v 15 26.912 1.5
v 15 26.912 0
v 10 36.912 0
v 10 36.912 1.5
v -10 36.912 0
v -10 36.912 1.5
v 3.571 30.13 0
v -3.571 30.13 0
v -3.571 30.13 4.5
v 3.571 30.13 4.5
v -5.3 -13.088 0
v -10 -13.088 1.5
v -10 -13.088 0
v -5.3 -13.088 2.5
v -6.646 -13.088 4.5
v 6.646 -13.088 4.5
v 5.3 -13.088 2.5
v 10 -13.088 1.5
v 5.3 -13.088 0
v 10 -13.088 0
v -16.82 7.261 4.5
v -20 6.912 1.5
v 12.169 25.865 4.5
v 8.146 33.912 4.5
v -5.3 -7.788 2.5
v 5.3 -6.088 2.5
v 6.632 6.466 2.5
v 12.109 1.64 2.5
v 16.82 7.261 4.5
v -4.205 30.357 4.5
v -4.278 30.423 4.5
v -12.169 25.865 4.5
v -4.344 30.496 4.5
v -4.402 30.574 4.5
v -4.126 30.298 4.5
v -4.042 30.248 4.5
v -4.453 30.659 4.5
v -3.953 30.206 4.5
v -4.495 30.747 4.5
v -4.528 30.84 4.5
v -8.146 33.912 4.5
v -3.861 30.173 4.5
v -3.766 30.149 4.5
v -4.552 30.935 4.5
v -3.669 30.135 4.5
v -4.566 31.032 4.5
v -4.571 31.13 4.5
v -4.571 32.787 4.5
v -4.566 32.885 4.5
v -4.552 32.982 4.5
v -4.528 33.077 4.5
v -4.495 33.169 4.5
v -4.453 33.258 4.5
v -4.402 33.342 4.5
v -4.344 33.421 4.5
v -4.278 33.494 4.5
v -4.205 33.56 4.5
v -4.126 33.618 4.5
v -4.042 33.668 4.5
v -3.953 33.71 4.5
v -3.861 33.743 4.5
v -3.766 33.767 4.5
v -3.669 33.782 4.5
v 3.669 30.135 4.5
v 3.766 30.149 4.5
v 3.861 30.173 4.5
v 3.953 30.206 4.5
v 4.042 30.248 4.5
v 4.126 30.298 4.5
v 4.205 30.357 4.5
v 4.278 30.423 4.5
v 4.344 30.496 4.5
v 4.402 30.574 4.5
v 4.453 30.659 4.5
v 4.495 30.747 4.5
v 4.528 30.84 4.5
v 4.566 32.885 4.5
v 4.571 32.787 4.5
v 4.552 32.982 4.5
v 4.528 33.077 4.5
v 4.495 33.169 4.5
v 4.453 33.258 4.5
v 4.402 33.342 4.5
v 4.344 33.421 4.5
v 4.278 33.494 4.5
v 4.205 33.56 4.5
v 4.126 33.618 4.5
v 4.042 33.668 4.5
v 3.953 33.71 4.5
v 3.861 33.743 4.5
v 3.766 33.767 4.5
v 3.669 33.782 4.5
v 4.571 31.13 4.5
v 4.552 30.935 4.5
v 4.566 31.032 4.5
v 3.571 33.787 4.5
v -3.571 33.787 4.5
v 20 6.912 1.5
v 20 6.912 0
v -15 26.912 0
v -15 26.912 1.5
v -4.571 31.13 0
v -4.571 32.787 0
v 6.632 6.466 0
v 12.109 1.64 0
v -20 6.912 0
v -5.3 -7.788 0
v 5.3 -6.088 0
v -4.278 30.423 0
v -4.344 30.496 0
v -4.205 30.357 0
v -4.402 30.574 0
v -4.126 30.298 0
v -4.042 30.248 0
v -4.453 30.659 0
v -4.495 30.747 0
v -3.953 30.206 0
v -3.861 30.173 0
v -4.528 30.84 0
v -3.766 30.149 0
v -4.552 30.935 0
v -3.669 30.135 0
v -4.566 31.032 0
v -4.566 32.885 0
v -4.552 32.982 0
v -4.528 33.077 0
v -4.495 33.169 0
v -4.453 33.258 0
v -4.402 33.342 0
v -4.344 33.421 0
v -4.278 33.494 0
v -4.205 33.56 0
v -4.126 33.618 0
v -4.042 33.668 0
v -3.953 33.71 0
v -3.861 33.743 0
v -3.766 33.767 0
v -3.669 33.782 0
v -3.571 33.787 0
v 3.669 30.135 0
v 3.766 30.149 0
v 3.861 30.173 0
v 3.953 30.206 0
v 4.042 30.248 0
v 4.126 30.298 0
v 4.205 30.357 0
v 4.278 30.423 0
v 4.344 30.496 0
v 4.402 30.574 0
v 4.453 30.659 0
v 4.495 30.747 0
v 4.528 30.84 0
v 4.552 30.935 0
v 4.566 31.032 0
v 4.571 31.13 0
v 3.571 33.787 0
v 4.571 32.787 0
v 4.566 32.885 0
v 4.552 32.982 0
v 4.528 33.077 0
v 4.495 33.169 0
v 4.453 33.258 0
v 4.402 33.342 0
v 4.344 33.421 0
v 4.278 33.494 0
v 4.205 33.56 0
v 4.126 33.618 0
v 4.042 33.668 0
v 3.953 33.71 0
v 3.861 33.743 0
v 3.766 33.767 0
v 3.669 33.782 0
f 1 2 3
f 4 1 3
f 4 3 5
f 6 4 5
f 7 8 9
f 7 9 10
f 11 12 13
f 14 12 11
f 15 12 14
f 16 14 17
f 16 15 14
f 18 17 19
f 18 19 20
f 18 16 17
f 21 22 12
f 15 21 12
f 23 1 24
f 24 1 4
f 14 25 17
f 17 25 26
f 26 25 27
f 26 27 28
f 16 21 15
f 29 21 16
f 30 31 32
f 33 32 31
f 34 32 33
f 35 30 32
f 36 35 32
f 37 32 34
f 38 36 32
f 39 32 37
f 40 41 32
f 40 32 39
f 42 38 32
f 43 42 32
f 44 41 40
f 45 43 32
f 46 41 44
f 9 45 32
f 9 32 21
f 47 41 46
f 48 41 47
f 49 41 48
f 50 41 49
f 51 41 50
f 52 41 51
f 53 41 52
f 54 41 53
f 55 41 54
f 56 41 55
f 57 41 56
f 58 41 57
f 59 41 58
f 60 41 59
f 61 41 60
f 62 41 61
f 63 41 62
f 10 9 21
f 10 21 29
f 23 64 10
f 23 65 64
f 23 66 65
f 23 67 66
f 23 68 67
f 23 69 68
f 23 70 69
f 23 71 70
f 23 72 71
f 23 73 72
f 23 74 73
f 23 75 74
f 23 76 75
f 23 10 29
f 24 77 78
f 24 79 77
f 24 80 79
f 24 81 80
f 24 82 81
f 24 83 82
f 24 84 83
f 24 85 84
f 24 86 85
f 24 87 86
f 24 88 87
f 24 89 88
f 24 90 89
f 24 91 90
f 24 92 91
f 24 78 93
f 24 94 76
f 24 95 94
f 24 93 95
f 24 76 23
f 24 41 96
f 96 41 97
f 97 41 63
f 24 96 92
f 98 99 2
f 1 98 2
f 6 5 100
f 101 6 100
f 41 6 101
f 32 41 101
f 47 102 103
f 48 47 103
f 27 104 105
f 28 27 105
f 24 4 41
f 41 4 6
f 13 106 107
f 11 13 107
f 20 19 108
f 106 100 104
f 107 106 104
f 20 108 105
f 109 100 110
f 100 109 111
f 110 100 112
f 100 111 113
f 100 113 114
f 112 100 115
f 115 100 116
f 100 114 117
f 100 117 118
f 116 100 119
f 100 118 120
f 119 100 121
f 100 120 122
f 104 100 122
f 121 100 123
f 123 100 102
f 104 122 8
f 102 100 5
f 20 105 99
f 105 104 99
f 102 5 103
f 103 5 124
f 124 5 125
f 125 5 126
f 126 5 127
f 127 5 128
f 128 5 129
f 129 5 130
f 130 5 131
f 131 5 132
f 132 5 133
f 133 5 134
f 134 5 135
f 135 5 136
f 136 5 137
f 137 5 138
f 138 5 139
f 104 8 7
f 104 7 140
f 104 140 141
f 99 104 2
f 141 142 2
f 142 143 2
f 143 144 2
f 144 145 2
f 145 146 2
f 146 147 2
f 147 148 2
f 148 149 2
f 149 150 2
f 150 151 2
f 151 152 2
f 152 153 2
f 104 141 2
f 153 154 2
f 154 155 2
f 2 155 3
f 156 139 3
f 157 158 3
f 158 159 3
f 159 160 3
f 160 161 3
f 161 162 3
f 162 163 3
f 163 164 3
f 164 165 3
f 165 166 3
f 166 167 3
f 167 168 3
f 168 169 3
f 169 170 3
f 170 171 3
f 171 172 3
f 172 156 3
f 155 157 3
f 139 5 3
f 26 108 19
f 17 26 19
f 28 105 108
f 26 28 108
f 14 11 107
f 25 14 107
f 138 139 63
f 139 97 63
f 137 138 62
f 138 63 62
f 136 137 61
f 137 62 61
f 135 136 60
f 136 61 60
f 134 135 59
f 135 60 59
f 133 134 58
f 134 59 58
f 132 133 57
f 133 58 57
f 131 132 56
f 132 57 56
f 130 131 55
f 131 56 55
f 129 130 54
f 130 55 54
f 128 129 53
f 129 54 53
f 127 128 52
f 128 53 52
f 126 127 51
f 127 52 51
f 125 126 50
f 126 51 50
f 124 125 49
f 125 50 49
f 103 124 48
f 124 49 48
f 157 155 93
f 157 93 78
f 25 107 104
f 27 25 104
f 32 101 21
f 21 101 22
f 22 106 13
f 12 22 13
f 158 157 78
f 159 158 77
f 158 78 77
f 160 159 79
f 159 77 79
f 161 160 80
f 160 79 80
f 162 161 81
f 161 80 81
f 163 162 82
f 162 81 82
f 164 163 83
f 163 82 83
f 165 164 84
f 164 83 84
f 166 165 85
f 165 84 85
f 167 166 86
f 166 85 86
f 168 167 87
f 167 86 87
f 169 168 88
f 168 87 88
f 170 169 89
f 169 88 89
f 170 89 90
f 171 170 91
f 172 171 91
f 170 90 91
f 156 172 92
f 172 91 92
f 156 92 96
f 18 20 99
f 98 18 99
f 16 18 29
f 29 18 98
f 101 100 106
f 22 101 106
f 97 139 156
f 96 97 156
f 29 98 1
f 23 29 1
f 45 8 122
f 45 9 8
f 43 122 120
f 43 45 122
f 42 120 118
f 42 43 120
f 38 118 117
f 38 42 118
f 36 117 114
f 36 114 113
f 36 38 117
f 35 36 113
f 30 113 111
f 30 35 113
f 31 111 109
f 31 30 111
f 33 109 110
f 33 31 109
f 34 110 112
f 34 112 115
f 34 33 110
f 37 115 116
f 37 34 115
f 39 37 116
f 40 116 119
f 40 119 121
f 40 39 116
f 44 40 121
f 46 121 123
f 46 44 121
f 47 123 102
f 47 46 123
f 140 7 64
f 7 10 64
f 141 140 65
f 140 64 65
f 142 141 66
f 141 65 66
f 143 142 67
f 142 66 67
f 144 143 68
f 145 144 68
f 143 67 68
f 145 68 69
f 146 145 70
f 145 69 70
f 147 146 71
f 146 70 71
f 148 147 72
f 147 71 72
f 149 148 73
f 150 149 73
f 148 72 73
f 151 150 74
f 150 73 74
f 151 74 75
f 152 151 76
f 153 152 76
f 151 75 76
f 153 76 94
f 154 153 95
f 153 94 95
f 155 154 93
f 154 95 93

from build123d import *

# Parameters (mm, degrees)
F0_W     = 9.141622
F0_H     = 3.656581
F1_DEPTH = 4.5
F3_DEPTH = 2
F4_SIZE  = 3
F5_R     = 1


with BuildPart() as f1:
    # F0 (on Top) → F1 (new body)
    with BuildSketch(Plane.XY):
        Polygon((10, 36.911765), (-10, 36.911765), (-15, 26.911765), (-20, 6.911765), (-10, -13.088235), (-5.3, -13.088235), (-5.3, -7.788235), (6.632093, 6.465869), (12.109291, 1.639867), (5.3, -6.088235), (5.3, -13.088235), (10, -13.088235), (20, 6.911765), (15, 26.911765), align=None)
        with Locations((0, 31.958237)):
            Rectangle(F0_W, F0_H, mode=Mode.SUBTRACT)
    extrude(amount=F1_DEPTH)

    # F2 (on face) → F3 (join)
    with BuildSketch(Plane.XY.offset(4.5)):
        Polygon((-5.3, -7.788235), (-5.3, -13.088235), (5.3, -13.088235), (5.3, -6.088235), (12.109291, 1.639867), (6.632093, 6.465869), align=None)
    extrude(amount=-F3_DEPTH)

    # F4
    f4_edges = [f1.edges().sort_by_distance(p)[0] for p in [
        (15, -3.088235, 4.5),
        (17.5, 16.911765, 4.5),
        (-15, -3.088235, 4.5),
        (-17.5, 16.911765, 4.5),
        (-12.5, 31.911765, 4.5),
        (0, 36.911765, 4.5),
        (12.5, 31.911765, 4.5),
    ]]
    chamfer(f4_edges, length=F4_SIZE)

    # F5
    f5_edges = [f1.edges().sort_by_distance(p)[0] for p in [
        (4.570811, 30.129947, 2.25),
        (-4.570811, 30.129947, 2.25),
        (-4.570811, 33.786528, 2.25),
        (4.570811, 33.786528, 2.25),
    ]]
    fillet(f5_edges, radius=F5_R)


solid = f1.part
